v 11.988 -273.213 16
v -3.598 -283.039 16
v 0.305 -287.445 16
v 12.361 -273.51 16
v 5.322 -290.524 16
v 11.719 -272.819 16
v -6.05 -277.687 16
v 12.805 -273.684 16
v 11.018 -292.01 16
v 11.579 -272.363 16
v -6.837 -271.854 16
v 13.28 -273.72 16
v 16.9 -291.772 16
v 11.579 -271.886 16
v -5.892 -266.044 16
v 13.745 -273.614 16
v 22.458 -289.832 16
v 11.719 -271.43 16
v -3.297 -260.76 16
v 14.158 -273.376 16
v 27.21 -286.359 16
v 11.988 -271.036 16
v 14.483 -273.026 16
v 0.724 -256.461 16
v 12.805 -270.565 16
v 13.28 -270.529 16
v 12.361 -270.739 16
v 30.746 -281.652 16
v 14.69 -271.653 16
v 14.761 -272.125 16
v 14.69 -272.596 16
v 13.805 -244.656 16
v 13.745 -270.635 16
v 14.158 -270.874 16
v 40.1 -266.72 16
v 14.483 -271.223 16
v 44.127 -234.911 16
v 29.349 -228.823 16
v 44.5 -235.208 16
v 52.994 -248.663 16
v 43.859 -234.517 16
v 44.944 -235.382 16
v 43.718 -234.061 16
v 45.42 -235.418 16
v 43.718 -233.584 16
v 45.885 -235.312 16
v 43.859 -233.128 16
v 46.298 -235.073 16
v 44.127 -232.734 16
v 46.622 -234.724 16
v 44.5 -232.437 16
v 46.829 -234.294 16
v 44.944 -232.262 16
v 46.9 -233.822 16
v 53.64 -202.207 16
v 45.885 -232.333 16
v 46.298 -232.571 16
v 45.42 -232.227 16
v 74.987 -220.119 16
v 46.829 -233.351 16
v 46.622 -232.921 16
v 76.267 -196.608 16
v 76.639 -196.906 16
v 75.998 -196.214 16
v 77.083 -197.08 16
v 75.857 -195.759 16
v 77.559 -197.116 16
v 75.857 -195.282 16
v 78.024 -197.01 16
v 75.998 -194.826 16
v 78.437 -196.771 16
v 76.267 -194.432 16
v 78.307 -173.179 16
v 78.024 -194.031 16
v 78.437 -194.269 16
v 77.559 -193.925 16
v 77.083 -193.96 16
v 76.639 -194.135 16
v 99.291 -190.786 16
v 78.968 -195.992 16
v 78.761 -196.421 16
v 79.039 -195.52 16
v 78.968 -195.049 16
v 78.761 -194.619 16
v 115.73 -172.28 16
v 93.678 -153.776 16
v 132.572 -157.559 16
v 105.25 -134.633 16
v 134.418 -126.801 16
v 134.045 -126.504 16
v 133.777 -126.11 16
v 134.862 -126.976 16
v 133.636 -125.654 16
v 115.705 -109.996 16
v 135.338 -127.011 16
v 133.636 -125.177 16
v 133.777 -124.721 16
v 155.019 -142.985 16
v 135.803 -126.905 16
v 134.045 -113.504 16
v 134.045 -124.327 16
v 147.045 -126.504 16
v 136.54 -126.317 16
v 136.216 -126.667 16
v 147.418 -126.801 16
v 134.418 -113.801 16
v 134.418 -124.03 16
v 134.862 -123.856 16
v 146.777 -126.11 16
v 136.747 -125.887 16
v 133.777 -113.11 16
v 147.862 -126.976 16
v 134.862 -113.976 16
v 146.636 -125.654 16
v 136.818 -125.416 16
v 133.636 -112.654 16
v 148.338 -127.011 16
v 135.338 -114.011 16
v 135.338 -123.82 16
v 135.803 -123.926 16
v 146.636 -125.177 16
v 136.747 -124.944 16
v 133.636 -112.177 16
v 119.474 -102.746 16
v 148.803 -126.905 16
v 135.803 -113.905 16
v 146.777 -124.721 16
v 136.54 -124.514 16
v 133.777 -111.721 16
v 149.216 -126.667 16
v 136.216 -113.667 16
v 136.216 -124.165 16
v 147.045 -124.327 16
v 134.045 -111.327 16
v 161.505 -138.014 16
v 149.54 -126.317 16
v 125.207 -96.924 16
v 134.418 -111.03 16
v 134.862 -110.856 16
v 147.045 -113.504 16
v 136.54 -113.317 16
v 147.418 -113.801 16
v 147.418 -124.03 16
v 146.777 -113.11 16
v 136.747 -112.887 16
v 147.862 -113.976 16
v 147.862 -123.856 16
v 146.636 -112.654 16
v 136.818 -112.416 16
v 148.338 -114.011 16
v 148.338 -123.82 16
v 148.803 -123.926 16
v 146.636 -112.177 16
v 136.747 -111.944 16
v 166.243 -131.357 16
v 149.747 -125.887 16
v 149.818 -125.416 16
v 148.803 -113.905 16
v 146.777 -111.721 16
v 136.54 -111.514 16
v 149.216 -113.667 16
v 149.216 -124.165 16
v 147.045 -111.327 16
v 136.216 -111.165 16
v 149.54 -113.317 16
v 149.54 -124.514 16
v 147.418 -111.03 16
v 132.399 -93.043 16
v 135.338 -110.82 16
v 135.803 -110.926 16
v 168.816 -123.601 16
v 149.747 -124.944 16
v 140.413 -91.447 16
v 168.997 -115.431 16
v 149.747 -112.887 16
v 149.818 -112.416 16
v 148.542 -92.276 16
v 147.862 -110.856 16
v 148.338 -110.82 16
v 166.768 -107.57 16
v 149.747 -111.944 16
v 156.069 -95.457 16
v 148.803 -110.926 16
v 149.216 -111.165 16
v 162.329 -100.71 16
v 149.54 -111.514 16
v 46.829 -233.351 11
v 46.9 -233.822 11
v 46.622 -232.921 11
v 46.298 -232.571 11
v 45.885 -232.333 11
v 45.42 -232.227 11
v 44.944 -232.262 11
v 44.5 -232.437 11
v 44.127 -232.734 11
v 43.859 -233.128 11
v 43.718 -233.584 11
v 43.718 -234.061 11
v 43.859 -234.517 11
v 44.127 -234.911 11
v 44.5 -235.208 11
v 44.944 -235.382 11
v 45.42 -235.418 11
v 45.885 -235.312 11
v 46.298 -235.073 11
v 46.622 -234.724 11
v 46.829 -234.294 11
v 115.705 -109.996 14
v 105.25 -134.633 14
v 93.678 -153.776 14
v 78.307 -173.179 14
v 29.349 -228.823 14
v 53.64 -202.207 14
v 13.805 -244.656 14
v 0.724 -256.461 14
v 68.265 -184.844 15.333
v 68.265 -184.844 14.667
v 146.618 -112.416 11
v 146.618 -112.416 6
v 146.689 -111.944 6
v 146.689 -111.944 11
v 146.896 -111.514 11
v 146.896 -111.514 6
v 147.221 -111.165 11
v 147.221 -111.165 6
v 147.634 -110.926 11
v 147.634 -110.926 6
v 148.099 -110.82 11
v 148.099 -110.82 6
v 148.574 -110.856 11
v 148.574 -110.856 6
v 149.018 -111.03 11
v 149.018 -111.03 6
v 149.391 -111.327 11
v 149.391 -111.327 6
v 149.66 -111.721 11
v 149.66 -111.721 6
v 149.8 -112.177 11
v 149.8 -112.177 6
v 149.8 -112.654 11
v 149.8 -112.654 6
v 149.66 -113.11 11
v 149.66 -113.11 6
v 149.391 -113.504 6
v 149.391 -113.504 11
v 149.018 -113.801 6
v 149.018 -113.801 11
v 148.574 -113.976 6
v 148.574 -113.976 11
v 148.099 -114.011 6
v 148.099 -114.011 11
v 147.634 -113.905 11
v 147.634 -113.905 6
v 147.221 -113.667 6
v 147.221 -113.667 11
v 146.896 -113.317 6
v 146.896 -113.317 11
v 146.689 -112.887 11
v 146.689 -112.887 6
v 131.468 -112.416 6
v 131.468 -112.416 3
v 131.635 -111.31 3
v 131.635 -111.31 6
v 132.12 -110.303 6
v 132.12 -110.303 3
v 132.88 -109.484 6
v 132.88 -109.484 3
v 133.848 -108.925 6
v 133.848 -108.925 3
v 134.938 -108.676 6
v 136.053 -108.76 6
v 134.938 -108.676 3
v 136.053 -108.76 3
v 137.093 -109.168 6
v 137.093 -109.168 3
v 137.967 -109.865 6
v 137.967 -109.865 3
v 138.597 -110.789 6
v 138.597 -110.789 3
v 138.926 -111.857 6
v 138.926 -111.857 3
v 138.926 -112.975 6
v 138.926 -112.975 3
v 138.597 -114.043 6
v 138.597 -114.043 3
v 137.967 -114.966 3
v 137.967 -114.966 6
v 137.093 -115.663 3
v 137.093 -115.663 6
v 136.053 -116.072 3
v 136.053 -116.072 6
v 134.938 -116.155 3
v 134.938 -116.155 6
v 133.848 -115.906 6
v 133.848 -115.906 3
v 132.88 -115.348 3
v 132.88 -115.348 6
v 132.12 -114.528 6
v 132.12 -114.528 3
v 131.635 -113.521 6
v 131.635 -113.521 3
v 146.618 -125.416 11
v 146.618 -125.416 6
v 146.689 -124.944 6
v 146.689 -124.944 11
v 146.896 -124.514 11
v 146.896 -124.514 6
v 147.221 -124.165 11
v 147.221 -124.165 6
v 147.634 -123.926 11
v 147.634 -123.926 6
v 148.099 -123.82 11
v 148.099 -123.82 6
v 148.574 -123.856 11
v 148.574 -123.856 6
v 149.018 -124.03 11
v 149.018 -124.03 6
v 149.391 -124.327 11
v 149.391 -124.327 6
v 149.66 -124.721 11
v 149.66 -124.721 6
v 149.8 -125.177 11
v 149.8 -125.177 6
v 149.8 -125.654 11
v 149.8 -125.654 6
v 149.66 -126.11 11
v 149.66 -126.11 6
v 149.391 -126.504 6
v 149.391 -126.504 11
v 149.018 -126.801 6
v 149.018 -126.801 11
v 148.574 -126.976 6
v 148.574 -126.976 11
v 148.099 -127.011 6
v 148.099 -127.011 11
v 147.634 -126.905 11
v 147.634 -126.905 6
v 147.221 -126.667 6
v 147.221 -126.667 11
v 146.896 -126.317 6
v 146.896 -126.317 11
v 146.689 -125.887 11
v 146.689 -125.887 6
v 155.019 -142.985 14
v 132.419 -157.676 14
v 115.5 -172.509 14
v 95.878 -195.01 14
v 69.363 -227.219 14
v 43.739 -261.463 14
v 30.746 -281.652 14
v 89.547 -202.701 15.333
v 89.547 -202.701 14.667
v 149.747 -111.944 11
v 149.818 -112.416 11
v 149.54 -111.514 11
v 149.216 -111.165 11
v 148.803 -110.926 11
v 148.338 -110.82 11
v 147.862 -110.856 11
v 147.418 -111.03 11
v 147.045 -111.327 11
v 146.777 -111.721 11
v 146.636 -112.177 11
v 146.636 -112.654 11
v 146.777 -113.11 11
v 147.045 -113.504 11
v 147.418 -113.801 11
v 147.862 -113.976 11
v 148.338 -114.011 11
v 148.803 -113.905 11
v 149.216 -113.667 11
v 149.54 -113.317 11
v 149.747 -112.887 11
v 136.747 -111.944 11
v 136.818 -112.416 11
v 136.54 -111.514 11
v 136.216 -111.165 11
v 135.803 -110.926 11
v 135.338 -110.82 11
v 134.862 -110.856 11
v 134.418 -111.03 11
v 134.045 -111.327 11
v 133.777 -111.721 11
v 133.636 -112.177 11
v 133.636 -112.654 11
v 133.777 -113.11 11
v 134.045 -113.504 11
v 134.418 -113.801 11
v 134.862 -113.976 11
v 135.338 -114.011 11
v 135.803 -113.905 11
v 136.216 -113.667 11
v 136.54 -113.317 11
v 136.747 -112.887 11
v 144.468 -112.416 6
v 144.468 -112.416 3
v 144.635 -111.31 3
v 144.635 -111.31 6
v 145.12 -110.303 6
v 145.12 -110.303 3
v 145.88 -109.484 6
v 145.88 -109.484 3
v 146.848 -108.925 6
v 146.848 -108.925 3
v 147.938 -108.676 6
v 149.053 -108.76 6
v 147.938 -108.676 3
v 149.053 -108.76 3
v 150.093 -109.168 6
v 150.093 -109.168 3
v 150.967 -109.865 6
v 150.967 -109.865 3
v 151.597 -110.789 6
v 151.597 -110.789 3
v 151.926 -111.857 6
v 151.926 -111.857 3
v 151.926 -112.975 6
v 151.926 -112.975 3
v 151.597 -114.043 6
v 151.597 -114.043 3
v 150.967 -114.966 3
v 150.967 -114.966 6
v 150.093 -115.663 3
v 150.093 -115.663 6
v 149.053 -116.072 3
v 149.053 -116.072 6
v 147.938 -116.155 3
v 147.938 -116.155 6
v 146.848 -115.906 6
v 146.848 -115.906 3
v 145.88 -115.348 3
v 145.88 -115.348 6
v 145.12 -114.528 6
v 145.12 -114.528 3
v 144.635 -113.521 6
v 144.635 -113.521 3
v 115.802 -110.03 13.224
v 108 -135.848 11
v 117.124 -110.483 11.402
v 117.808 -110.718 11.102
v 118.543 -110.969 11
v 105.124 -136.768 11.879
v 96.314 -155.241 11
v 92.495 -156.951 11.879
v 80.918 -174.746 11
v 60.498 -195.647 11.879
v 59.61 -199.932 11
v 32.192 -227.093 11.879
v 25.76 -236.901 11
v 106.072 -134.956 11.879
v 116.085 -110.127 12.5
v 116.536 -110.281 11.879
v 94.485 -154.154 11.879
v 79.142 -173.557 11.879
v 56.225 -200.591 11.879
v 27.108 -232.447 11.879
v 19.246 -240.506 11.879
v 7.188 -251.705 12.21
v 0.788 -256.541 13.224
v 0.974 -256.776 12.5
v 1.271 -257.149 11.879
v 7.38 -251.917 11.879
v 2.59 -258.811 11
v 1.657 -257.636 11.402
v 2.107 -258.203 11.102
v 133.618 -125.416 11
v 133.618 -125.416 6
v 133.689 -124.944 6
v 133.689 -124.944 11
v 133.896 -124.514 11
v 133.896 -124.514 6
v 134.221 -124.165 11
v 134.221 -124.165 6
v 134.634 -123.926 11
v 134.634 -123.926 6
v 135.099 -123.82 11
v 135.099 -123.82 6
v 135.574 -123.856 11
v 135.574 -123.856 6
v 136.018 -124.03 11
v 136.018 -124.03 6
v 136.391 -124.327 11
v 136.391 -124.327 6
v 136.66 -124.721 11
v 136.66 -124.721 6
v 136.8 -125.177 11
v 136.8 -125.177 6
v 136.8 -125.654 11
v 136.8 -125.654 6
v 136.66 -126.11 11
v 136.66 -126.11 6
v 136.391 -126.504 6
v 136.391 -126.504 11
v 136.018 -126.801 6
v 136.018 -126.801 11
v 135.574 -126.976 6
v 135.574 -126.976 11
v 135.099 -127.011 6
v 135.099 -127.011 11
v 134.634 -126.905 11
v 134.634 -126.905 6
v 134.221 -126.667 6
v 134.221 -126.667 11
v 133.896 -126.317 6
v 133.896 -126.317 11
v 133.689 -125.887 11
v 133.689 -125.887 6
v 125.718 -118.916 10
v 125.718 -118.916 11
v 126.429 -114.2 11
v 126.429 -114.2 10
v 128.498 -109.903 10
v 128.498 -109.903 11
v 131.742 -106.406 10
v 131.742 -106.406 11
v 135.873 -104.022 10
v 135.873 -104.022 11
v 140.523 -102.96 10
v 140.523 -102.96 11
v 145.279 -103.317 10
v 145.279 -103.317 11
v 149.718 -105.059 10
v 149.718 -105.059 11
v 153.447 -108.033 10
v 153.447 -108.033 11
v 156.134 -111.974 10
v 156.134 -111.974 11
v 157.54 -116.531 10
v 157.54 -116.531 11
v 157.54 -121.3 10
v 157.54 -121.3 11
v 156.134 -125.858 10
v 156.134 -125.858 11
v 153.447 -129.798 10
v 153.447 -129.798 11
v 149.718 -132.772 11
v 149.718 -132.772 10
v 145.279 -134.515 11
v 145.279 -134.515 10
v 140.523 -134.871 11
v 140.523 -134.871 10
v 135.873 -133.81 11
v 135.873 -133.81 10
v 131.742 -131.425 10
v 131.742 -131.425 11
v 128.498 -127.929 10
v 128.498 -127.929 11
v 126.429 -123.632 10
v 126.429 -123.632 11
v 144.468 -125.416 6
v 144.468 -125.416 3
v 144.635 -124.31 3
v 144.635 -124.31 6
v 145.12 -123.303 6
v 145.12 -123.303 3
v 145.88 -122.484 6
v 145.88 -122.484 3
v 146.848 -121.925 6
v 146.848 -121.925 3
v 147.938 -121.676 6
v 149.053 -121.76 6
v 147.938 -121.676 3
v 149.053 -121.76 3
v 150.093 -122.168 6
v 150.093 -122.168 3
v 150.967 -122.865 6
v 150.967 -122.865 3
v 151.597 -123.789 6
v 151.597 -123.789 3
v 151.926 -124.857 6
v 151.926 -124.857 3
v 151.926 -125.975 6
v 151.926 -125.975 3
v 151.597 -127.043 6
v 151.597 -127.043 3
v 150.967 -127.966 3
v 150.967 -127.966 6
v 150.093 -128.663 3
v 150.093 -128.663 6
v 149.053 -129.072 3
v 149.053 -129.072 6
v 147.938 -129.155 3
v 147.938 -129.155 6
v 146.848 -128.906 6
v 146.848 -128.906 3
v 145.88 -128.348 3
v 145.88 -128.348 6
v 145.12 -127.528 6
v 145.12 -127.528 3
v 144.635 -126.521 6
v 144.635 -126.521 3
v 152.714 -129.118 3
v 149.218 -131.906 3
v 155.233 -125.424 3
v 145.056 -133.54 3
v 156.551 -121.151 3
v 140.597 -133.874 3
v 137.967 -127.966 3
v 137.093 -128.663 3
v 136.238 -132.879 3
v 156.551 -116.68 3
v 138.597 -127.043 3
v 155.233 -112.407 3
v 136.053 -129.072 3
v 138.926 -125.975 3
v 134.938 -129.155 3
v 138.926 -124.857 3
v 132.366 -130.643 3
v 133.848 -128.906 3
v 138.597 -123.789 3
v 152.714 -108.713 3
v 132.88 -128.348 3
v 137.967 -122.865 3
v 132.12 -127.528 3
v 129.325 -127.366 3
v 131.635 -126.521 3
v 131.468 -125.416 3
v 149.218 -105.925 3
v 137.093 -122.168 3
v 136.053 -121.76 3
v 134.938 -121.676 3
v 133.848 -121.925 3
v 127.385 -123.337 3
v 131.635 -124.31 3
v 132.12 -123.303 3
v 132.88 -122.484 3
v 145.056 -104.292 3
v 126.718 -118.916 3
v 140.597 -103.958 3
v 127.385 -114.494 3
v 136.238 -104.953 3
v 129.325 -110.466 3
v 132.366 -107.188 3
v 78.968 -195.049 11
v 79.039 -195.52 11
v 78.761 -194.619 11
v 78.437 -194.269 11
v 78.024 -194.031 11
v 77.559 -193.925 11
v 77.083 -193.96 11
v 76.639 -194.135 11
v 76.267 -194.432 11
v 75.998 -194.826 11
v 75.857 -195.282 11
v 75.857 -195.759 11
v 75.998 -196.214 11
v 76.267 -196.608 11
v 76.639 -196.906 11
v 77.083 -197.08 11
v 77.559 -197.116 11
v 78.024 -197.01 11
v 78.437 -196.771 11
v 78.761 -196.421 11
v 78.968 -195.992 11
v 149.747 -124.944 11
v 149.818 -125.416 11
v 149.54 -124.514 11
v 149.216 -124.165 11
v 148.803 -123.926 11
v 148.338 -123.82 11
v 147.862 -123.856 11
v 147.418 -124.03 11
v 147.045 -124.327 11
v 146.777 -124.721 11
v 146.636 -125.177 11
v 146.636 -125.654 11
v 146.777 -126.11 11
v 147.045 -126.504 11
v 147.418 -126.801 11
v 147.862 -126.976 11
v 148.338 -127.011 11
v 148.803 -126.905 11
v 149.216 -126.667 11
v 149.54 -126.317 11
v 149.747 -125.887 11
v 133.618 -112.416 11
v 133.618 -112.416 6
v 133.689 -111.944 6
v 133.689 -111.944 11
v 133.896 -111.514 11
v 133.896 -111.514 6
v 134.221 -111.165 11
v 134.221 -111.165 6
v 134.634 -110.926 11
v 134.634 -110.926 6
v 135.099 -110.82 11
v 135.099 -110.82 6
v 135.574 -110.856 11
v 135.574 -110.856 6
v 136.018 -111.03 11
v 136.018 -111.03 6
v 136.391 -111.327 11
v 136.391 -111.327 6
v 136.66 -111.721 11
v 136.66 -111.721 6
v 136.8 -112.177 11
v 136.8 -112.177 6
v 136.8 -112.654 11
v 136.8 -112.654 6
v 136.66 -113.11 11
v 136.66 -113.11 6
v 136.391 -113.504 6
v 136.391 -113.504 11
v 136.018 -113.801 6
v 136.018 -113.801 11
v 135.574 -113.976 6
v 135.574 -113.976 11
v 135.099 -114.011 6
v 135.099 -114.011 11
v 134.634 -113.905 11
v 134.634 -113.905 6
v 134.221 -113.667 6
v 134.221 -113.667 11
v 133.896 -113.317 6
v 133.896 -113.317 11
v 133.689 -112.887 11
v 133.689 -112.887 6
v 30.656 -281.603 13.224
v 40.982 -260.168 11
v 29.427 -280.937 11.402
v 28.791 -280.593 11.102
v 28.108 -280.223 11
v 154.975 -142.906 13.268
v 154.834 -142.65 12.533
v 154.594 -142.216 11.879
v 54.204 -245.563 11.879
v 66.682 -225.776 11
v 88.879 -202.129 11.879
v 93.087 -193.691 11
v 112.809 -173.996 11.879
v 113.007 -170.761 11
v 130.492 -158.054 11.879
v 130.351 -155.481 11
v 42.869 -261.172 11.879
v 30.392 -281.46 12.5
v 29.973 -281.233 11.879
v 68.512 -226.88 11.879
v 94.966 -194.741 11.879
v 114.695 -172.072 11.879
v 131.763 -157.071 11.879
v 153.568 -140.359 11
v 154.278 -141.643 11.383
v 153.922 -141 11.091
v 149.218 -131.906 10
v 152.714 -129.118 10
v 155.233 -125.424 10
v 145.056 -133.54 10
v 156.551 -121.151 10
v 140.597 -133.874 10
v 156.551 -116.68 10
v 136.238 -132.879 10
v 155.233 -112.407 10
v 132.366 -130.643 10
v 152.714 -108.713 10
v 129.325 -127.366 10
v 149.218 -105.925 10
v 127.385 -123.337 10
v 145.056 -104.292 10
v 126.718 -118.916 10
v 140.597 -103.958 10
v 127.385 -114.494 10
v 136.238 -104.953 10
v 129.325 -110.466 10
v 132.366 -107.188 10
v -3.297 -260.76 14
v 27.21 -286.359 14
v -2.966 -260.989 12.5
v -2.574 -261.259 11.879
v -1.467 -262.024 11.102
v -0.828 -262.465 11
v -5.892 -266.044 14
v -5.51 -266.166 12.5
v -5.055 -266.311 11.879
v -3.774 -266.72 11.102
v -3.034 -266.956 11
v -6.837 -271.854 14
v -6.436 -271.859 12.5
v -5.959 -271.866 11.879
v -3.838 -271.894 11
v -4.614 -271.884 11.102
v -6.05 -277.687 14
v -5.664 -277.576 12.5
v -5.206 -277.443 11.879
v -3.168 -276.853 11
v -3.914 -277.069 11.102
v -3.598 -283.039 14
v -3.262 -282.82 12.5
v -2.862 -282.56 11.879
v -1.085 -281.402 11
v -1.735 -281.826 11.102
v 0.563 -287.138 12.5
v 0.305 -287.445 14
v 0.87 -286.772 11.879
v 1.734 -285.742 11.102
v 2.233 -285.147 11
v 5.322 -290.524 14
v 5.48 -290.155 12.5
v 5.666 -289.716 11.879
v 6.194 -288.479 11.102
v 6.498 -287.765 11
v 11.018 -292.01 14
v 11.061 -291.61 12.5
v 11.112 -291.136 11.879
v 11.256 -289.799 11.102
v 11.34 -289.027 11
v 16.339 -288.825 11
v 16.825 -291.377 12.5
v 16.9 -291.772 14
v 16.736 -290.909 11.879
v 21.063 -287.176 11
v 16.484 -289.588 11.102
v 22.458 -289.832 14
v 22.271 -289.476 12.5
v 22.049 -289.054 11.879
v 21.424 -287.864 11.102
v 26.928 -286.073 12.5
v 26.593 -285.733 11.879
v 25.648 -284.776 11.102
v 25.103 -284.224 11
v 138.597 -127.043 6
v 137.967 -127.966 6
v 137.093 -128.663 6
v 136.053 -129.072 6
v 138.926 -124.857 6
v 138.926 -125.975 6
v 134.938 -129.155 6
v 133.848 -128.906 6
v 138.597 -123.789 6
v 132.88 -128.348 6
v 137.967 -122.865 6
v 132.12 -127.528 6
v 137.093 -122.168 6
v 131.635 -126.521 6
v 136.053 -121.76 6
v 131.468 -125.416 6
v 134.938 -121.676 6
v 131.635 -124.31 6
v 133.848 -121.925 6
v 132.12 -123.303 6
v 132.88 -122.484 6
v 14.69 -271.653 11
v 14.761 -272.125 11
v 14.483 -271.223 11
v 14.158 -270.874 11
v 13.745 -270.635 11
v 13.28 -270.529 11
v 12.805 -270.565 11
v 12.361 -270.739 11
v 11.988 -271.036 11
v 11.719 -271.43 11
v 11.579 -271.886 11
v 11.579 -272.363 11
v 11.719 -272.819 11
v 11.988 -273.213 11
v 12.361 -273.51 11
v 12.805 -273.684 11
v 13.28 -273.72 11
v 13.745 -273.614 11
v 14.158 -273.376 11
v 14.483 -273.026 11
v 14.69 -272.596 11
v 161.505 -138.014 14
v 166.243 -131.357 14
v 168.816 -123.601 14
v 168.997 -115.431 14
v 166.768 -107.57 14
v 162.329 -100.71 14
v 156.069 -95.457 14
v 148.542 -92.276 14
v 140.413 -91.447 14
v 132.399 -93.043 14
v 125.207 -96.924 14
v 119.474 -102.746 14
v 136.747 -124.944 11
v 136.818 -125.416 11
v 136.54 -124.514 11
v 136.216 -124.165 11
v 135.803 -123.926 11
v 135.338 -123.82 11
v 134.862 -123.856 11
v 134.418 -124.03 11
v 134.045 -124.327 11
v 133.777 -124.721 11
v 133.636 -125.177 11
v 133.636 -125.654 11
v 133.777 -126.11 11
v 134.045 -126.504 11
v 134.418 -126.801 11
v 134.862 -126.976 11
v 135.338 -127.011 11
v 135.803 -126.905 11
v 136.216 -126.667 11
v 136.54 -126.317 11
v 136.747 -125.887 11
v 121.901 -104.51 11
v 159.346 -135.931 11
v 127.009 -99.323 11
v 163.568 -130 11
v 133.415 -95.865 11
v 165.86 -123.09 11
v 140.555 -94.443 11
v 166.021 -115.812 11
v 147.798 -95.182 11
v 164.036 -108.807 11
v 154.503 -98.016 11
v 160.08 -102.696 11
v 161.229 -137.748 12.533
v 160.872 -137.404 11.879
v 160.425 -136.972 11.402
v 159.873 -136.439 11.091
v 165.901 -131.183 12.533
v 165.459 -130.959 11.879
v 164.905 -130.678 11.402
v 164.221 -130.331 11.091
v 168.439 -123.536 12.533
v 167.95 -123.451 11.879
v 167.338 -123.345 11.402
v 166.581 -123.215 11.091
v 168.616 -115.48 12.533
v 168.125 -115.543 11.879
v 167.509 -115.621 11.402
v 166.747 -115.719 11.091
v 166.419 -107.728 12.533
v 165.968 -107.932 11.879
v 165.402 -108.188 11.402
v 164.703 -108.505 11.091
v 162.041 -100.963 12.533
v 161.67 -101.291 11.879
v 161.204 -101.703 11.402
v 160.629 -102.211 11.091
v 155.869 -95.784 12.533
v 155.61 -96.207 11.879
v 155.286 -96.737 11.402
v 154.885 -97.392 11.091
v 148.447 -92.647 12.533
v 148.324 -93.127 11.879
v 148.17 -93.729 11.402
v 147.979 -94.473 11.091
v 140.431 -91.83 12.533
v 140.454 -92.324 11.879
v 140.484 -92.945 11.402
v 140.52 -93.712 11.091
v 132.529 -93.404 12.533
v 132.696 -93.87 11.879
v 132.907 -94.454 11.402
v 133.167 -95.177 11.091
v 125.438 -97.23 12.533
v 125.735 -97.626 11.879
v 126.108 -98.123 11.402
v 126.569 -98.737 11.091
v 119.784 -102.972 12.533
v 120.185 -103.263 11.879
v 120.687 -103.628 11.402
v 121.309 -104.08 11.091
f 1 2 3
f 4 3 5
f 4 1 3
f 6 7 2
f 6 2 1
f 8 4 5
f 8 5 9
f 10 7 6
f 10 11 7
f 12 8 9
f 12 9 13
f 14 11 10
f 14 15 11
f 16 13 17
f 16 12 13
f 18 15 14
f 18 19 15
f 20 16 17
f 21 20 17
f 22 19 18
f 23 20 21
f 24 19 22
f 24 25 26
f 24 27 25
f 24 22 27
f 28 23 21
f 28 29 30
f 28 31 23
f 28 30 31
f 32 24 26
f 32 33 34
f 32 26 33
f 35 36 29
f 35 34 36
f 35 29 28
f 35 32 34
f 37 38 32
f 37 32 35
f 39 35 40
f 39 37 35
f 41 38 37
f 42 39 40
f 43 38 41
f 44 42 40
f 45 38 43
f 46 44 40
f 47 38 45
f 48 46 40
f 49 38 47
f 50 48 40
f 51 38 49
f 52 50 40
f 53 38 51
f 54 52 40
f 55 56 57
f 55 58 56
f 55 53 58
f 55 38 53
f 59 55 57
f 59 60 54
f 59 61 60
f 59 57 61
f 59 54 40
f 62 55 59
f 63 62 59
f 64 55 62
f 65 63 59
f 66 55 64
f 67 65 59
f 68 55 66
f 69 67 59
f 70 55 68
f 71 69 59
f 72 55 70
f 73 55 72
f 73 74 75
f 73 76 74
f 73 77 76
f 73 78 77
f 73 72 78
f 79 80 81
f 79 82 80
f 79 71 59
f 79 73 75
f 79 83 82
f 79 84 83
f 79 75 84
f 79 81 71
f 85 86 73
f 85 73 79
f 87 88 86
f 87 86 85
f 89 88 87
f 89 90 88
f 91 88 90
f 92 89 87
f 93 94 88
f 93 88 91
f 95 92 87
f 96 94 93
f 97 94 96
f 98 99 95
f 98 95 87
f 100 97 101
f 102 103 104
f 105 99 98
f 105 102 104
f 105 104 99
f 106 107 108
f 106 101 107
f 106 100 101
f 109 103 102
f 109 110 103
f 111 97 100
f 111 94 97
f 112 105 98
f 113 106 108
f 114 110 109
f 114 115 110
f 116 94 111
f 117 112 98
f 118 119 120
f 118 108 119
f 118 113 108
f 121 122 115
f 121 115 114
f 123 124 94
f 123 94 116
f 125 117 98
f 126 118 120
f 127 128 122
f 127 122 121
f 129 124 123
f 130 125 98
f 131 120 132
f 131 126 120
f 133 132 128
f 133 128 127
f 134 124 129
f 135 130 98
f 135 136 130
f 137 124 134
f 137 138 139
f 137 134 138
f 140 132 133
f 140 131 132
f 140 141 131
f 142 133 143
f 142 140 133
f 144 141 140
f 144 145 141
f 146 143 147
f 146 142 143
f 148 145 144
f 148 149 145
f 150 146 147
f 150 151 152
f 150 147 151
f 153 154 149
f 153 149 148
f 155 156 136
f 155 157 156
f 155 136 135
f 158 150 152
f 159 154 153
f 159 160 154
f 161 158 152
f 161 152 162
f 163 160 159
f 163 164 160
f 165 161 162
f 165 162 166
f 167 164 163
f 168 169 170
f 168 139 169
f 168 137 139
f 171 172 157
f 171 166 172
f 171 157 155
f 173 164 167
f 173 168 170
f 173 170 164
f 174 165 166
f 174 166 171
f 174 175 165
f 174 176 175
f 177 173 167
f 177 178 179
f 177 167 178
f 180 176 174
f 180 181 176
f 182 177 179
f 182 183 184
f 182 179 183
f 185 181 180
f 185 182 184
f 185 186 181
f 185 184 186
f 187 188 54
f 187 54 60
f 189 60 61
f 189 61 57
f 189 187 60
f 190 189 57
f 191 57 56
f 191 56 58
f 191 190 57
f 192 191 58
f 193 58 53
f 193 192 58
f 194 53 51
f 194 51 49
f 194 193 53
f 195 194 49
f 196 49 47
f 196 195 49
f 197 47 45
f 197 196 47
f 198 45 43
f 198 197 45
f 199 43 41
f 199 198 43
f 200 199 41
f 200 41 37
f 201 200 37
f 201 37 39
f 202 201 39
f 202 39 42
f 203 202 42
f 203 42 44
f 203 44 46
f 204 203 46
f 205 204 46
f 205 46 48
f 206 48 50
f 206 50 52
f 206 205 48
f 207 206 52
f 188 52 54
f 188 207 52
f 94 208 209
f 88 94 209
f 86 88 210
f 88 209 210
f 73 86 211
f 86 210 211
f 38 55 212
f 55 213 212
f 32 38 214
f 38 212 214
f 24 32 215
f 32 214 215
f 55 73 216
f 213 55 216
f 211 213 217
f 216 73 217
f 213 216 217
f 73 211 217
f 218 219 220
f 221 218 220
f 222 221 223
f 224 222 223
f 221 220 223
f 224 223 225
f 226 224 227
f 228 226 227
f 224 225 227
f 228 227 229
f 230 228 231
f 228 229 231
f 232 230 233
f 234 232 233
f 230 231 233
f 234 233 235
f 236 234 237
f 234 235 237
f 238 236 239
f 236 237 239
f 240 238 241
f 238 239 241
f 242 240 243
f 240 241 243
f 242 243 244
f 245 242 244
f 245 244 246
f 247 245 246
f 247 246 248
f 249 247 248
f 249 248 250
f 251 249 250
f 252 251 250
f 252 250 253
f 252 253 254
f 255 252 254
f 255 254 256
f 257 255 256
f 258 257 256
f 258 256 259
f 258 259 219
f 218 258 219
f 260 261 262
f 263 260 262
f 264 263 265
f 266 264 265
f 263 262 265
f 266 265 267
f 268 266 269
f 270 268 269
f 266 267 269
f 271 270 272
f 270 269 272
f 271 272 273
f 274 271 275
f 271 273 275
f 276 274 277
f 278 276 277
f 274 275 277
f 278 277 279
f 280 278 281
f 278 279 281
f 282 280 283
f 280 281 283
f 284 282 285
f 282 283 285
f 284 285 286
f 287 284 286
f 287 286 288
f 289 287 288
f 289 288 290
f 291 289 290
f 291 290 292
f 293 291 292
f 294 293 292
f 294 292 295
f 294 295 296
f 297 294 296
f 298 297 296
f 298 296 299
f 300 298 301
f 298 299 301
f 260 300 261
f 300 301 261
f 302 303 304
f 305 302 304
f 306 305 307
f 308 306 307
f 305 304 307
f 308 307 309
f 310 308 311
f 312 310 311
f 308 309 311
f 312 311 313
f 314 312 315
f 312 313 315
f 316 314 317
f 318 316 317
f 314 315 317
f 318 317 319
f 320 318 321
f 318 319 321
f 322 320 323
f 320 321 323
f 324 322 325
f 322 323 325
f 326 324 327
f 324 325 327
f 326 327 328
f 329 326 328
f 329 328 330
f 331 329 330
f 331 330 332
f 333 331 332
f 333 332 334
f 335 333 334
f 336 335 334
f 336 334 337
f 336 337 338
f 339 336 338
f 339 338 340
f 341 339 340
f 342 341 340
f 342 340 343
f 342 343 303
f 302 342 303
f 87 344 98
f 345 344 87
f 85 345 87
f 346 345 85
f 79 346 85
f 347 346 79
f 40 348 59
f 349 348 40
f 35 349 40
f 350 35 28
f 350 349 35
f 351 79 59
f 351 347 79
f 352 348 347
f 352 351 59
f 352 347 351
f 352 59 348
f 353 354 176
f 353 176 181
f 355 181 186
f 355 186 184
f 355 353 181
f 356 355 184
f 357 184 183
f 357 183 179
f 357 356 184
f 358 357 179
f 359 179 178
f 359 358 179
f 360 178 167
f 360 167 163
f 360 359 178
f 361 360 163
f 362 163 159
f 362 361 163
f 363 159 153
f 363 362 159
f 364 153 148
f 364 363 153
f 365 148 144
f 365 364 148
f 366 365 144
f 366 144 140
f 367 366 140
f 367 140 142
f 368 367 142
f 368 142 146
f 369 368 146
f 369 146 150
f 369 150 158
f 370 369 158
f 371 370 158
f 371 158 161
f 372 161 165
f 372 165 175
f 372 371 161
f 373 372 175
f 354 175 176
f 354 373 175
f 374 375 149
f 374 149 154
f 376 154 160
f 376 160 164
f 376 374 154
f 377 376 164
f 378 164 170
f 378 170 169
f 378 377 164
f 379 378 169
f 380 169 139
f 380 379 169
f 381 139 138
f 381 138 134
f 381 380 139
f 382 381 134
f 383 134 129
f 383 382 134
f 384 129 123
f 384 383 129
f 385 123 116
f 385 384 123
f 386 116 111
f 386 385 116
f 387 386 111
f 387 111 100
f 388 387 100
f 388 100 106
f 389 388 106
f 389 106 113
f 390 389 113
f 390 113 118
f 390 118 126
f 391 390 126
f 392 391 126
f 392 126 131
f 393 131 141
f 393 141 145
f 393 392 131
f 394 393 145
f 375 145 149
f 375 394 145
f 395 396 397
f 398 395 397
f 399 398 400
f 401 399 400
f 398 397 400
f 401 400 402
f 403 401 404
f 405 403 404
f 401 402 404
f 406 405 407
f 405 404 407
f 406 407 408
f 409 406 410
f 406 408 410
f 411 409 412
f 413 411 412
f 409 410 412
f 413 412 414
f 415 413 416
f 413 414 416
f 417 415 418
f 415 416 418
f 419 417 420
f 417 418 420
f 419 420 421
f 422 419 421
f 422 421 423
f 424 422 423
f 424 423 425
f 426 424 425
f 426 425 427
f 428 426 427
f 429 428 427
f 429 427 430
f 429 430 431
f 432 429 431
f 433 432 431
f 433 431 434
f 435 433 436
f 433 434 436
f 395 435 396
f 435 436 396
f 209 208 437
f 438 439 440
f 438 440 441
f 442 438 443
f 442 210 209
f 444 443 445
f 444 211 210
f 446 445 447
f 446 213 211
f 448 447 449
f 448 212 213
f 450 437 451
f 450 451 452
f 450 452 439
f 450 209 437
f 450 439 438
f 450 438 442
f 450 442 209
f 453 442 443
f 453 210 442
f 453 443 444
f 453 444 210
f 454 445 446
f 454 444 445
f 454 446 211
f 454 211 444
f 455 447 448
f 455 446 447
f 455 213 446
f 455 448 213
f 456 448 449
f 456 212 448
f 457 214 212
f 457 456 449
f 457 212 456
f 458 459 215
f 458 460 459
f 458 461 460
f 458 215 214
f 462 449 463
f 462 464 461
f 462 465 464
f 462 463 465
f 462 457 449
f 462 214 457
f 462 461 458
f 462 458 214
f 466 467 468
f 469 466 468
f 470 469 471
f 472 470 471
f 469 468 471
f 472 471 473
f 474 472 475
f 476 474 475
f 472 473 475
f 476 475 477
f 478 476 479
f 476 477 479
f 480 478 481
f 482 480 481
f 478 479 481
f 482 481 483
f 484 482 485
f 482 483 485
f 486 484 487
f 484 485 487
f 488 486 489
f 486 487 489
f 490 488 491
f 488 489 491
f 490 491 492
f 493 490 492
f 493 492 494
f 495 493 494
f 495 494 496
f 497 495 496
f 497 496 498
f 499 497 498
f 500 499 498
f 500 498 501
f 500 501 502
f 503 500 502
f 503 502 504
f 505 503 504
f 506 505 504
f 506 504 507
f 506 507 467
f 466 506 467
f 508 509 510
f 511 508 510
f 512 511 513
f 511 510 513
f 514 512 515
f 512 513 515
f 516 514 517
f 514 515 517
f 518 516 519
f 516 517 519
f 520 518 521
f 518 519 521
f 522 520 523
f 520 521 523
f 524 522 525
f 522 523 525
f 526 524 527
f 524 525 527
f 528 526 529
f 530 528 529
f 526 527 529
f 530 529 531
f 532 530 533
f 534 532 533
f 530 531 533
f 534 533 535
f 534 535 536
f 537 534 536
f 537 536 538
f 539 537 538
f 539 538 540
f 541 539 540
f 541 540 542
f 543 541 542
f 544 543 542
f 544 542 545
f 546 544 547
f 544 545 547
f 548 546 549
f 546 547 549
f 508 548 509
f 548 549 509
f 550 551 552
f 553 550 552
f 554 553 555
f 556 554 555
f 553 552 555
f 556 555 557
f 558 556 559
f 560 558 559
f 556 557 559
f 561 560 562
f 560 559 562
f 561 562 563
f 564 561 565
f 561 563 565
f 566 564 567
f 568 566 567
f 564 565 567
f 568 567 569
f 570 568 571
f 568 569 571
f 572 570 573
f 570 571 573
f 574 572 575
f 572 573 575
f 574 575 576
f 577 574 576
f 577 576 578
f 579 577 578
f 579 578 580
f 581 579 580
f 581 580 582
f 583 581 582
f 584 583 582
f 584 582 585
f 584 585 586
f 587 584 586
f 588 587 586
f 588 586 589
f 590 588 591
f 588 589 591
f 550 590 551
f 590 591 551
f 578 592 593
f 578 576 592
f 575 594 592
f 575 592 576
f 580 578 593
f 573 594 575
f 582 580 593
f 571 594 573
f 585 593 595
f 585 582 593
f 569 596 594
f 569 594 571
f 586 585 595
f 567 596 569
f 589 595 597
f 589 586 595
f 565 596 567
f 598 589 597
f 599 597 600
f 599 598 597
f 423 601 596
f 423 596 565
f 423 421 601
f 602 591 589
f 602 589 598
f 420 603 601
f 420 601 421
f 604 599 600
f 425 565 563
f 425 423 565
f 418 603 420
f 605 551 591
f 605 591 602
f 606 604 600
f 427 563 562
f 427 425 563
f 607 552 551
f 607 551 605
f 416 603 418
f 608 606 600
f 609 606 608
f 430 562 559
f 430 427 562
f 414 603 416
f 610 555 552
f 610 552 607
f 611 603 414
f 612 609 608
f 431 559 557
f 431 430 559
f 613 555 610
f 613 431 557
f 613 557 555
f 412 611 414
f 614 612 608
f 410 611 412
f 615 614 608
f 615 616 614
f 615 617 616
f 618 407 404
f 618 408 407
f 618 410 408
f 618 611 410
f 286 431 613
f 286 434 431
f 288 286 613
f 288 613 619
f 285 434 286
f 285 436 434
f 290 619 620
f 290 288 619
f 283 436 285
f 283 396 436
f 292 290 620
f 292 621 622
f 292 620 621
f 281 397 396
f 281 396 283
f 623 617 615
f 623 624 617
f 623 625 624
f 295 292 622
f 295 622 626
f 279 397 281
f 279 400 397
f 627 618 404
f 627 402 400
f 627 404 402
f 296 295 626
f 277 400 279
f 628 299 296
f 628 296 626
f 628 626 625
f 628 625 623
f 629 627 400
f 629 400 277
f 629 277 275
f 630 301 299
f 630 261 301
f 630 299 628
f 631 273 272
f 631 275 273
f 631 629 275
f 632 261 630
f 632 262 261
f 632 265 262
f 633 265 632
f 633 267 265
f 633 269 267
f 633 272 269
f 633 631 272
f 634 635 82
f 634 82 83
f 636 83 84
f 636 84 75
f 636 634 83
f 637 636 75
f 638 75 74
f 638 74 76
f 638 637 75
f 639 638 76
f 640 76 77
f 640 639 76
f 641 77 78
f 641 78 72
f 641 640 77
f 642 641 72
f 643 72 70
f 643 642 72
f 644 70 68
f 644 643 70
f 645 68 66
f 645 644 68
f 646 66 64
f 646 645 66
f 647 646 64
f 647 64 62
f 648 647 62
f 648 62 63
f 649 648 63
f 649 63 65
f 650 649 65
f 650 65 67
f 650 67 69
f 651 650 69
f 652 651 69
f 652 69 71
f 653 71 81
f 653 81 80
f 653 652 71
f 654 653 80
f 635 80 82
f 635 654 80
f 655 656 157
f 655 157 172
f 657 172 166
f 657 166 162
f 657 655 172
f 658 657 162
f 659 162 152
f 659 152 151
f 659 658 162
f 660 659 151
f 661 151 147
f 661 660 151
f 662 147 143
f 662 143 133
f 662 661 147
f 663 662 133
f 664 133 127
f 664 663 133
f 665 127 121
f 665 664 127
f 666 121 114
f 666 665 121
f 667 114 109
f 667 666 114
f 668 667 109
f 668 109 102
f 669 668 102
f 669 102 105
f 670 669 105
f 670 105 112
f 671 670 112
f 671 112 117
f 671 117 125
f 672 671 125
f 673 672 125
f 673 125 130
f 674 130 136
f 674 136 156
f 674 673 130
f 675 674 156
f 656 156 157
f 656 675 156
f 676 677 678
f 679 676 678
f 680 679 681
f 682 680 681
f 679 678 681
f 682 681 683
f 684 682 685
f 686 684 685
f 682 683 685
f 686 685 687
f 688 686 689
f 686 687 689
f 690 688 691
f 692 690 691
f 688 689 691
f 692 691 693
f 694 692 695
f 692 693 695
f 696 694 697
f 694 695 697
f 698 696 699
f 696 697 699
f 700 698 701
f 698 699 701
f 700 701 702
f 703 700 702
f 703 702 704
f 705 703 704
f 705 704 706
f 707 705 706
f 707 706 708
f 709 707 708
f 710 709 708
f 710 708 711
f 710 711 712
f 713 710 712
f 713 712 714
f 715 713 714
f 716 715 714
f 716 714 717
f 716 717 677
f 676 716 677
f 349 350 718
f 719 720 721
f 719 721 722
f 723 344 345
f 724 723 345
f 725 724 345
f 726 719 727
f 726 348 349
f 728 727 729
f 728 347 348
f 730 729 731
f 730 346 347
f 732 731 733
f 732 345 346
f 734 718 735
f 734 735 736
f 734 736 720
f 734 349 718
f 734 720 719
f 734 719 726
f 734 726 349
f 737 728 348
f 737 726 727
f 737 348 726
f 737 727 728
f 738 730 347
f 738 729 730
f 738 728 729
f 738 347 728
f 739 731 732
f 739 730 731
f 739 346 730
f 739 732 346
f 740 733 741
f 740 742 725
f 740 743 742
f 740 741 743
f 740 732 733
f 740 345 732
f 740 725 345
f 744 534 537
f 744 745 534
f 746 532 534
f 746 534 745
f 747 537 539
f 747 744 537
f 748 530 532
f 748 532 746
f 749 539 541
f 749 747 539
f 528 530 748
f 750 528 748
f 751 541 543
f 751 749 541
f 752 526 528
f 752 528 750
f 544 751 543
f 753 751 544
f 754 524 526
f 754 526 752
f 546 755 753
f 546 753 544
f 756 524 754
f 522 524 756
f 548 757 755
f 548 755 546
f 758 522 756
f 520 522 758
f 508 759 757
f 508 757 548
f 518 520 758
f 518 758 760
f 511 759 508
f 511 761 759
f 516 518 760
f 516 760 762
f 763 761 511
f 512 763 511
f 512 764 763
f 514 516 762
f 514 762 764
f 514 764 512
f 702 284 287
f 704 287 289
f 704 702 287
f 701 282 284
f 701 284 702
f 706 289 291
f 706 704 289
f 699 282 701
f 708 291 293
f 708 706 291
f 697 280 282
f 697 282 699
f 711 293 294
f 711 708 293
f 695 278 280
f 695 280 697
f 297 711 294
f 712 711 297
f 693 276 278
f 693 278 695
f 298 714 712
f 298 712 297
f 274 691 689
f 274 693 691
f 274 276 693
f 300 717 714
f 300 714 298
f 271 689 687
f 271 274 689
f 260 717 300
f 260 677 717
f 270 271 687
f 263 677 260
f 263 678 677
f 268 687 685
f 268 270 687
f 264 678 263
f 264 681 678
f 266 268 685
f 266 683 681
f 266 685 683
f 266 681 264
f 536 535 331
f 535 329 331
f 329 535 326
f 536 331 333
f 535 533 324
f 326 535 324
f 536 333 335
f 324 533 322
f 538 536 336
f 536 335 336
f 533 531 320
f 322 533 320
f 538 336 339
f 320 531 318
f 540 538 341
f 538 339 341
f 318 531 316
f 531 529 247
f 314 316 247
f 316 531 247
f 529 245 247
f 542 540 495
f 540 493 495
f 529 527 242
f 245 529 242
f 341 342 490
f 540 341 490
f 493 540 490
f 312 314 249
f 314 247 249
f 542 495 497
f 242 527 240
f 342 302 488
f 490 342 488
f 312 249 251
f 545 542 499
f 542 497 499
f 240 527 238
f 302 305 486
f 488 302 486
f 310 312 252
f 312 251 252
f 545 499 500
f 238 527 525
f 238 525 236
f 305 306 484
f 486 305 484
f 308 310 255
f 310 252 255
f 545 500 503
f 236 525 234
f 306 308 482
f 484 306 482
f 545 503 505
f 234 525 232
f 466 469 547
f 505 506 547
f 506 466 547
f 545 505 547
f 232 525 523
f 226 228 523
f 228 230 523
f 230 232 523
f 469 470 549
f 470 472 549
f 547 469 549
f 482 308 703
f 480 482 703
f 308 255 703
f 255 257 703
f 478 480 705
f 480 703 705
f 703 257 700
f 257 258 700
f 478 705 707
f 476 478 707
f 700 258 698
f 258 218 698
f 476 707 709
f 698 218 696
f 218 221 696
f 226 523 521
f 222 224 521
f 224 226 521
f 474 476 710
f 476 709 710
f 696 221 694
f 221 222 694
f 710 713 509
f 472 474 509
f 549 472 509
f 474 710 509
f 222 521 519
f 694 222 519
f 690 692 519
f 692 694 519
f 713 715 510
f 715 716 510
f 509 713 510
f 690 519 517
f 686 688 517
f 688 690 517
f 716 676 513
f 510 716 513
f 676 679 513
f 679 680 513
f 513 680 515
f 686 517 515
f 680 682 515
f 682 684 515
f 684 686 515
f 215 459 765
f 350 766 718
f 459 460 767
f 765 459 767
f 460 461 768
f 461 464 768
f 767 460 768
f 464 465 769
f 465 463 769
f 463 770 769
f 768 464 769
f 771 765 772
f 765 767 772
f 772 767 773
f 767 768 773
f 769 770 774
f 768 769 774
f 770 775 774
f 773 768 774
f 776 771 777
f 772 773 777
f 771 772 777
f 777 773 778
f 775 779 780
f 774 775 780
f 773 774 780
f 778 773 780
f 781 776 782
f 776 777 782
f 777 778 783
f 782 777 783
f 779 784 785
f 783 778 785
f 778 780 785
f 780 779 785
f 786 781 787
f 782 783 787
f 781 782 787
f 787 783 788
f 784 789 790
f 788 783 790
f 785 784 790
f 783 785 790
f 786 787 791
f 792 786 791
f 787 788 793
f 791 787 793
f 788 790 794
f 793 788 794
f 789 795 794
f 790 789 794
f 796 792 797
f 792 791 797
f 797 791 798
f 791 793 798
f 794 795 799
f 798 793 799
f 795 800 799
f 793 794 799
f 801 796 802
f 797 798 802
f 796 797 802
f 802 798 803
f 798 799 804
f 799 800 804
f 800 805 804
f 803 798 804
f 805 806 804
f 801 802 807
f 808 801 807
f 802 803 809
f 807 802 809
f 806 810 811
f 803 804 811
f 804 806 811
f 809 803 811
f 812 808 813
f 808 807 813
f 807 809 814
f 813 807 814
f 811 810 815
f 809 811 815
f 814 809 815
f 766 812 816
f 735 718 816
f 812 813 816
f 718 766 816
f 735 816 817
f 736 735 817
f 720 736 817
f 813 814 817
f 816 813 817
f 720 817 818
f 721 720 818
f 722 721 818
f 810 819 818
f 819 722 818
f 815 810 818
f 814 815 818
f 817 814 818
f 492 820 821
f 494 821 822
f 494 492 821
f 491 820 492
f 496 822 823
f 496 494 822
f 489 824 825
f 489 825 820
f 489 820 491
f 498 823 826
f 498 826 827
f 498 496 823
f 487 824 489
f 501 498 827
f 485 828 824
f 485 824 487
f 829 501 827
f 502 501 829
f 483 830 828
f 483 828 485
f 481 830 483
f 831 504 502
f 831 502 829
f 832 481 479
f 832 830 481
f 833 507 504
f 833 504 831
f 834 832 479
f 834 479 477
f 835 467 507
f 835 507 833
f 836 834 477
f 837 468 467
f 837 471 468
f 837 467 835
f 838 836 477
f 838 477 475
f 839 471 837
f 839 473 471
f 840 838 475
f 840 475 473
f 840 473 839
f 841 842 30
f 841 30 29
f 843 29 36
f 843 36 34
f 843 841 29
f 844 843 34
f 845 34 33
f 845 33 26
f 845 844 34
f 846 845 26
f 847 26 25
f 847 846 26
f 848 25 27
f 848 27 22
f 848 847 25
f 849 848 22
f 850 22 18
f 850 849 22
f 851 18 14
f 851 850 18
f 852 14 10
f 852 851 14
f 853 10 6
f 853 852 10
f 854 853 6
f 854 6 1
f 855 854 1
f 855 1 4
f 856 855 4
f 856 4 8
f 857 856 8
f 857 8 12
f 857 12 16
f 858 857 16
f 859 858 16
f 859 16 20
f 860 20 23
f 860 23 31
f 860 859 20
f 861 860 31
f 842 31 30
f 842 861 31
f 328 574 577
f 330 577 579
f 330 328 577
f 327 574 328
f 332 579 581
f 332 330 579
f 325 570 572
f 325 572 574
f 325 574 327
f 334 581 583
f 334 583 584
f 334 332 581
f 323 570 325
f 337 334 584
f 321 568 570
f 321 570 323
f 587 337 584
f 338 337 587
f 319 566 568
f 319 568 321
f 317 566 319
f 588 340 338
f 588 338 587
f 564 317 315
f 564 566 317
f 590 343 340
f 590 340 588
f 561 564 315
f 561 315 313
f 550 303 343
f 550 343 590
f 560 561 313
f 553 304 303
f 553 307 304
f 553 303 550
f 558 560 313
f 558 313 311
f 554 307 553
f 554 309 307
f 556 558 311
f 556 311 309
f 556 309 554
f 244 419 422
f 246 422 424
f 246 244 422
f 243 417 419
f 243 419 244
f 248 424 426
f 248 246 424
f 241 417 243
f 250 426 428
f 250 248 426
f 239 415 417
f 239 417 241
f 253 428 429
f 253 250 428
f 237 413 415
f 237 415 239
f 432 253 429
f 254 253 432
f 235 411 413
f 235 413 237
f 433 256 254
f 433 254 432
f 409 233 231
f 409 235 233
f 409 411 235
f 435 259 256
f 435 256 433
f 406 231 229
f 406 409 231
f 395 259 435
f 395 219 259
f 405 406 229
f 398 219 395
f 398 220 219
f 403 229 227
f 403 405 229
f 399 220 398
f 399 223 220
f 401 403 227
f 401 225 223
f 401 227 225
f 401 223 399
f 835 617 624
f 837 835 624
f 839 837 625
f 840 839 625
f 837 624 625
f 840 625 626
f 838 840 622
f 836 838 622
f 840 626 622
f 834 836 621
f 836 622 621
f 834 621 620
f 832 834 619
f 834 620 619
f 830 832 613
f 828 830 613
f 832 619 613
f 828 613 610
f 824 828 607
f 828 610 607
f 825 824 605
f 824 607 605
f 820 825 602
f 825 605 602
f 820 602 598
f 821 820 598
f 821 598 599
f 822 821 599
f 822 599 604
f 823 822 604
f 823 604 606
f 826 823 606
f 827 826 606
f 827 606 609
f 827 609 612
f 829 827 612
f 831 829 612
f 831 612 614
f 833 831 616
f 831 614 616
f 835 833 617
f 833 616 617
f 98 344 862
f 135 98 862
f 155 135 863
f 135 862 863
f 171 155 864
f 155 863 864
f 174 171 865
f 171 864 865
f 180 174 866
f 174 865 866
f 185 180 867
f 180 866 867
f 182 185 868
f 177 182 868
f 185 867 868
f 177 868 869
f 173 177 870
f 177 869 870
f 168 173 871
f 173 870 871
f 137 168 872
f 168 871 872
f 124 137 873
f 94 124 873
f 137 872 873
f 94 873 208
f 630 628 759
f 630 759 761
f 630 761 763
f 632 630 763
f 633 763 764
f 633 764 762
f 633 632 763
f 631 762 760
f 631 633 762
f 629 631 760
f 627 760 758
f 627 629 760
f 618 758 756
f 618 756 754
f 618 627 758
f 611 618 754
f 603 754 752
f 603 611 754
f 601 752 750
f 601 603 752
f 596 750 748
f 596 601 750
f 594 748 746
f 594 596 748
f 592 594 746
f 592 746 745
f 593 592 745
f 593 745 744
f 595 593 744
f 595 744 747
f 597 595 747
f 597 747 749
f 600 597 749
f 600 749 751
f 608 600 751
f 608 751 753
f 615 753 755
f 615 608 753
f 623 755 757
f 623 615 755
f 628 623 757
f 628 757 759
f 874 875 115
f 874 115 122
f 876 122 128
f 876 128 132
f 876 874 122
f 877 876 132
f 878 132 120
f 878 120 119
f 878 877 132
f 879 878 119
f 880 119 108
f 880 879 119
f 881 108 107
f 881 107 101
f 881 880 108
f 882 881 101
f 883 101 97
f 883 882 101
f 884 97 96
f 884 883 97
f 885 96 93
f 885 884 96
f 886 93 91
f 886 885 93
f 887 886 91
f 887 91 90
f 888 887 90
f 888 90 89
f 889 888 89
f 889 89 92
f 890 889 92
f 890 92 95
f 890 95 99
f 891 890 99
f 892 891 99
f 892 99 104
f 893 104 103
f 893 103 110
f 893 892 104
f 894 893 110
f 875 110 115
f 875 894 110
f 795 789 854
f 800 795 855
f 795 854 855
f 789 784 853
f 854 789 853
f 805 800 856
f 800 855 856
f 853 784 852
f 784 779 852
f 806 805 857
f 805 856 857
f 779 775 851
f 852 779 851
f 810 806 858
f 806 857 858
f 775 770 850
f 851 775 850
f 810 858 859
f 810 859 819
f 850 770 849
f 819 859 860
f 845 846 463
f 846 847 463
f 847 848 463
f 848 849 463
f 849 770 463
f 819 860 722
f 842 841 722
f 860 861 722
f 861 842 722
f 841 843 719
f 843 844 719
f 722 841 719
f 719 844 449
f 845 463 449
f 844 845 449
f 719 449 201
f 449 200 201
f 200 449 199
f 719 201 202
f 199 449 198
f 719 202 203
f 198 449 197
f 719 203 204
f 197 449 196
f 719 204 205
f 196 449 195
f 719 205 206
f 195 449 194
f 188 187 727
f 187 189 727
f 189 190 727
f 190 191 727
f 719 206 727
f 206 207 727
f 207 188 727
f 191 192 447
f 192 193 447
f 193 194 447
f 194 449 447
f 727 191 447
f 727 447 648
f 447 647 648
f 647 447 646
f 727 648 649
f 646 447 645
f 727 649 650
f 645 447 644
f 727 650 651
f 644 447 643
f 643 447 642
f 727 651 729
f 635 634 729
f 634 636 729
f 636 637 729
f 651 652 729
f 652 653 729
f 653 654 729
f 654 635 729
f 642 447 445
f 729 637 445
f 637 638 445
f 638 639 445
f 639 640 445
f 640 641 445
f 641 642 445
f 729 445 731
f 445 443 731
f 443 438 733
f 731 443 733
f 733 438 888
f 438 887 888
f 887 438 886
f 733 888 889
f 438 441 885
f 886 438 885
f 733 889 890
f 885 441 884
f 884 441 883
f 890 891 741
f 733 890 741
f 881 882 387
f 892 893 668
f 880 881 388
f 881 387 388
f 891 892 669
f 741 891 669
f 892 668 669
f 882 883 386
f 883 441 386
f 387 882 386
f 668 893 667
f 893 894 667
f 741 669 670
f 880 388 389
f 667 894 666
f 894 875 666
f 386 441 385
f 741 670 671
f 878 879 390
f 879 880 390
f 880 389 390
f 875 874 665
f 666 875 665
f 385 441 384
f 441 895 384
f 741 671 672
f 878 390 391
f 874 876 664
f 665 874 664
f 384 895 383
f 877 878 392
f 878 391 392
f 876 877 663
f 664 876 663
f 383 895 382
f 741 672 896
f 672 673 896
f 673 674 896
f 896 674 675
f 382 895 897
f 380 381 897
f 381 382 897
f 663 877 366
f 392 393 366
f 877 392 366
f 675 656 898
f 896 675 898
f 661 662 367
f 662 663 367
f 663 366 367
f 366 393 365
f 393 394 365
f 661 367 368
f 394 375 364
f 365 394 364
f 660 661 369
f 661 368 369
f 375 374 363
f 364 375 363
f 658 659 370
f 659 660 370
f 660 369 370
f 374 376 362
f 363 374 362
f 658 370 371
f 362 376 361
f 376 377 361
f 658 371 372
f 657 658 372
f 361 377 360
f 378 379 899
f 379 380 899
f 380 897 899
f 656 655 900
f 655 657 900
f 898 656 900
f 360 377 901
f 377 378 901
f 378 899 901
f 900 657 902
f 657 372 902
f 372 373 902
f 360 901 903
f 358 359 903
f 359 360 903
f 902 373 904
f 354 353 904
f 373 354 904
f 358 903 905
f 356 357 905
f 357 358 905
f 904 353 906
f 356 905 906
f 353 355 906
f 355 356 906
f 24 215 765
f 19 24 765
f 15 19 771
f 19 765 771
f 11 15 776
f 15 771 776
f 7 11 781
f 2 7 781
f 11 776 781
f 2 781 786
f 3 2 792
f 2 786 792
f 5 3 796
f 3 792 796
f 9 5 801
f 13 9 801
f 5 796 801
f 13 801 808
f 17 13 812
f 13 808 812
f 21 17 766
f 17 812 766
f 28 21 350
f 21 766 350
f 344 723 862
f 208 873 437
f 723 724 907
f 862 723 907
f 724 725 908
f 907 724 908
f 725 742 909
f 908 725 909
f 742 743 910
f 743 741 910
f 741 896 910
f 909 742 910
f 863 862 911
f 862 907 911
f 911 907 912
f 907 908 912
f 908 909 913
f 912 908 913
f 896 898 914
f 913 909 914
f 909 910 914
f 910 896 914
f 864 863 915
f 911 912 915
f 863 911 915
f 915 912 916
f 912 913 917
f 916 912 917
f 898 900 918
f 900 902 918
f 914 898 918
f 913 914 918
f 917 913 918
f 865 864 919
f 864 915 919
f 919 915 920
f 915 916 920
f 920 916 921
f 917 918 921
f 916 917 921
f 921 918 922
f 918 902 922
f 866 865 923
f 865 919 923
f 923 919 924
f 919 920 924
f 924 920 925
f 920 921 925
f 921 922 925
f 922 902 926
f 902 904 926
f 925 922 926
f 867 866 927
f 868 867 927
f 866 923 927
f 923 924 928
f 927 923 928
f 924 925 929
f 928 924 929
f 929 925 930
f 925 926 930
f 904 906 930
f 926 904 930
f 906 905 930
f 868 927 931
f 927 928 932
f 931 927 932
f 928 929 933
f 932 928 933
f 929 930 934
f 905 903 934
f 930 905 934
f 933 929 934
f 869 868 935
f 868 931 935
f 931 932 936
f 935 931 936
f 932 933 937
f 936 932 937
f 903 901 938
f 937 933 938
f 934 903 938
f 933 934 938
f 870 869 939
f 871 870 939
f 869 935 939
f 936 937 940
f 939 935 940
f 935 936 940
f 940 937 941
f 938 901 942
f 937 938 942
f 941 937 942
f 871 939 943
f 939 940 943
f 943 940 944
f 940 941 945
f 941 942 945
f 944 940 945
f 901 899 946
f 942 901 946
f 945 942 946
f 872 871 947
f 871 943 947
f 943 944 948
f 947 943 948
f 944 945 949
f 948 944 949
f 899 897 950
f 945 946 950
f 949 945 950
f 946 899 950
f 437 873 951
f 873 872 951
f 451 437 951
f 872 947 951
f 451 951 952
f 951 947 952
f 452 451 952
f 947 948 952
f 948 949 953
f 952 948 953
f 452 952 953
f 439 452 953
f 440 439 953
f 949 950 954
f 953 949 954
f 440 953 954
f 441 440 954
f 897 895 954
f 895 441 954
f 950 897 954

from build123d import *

# Parameters (mm, degrees)
SKETCH1_R           = 1.6
BOSS_EXTRUDE1_DEPTH = 5
SKETCH2_R           = 16
SKETCH2_R_2         = 1.6
BOSS_EXTRUDE2_DEPTH = 1
BOSS_EXTRUDE3_START = 7
SKETCH3_R           = 15
SKETCH3_R_2         = 1.6
BOSS_EXTRUDE3_DEPTH = 7
SKETCH4_R           = 3.75
CUT_EXTRUDE1_DEPTH  = 3
VARFILLET2_R        = 3


with BuildPart() as part:
    # Sketch1 → Boss-Extrude1 (new body)
    with BuildSketch(Plane.XY.offset(11)):
        with BuildLine():
            ThreePointArc((155.019115612, -142.985112199), (159.394881243, -97.849485606), (115.704809966, -109.996492831))
            add(Edge.make_bspline(
                [(115.704809966, -109.996492831), (101.94879758, -150.116707379), (78.178790791, -171.772825461), (58.717079478, -197.082387325), (16.356999542, -244.049515564), (0.72448619, -256.46124476)],
                knots=[0, 0, 0, 0, 0.619090324, 0.719090324, 1, 1, 1, 1], degree=3))
            ThreePointArc((0.72448619, -256.46124476), (0.304947846, -287.445485278), (30.74561606, -281.651963762))
            add(Edge.make_bspline(
                [(155.019115612, -142.985112199), (117.897123756, -163.498941991), (100.69762913, -190.668374405), (79.152067085, -214.229377889), (40.254225745, -264.101669257), (30.74561606, -281.651963762)],
                knots=[0, 0, 0, 0, 0.619090324, 0.719090324, 1, 1, 1, 1], degree=3))
        make_face()
        with Locations((135.218221977, -112.415707792)):
            Circle(SKETCH1_R, mode=Mode.SUBTRACT)
        with Locations((148.218221977, -112.415707792)):
            Circle(SKETCH1_R, mode=Mode.SUBTRACT)
        with Locations((148.218221977, -125.415707792)):
            Circle(SKETCH1_R, mode=Mode.SUBTRACT)
        with Locations((135.218221977, -125.415707792)):
            Circle(SKETCH1_R, mode=Mode.SUBTRACT)
        with Locations((77.439461008, -195.520152104)):
            Circle(SKETCH1_R, mode=Mode.SUBTRACT)
        with Locations((45.300080524, -233.82237426)):
            Circle(SKETCH1_R, mode=Mode.SUBTRACT)
        with Locations((13.16070004, -272.124596416)):
            Circle(SKETCH1_R, mode=Mode.SUBTRACT)
    extrude(amount=BOSS_EXTRUDE1_DEPTH)

    # VarFillet2
    varfillet2_edges = [part.edges().sort_by_distance(p)[0] for p in [
        (65.360846316, -188.427744165, 11),
        (86.521548764, -206.183681785, 11),
    ]]
    fillet(varfillet2_edges, radius=VARFILLET2_R)


with BuildPart() as body_2:
    # Sketch2 → Boss-Extrude2 (new body)
    with BuildSketch(Plane(origin=(0, 0, 11), x_dir=(-1, 0, 0), z_dir=(0, 0, -1))):
        with Locations((-141.718221977, -118.915707792)):
            Circle(SKETCH2_R)
        with Locations((-148.218221977, -125.415707792)):
            Circle(SKETCH2_R_2, mode=Mode.SUBTRACT)
        with Locations((-135.218221977, -125.415707792)):
            Circle(SKETCH2_R_2, mode=Mode.SUBTRACT)
        with Locations((-148.218221977, -112.415707792)):
            Circle(SKETCH2_R_2, mode=Mode.SUBTRACT)
        with Locations((-135.218221977, -112.415707792)):
            Circle(SKETCH2_R_2, mode=Mode.SUBTRACT)
    extrude(amount=BOSS_EXTRUDE2_DEPTH)

    # Sketch3 → Boss-Extrude3 (add)
    with BuildSketch(Plane(origin=(0, 0, 10), x_dir=(-1, 0, 0), z_dir=(0, 0, -1)).offset(BOSS_EXTRUDE3_START)):
        with Locations((-141.718221977, -118.915707792)):
            Circle(SKETCH3_R)
        with Locations((-148.218221977, -125.415707792)):
            Circle(SKETCH3_R_2, mode=Mode.SUBTRACT)
        with Locations((-135.218221977, -125.415707792)):
            Circle(SKETCH3_R_2, mode=Mode.SUBTRACT)
        with Locations((-148.218221977, -112.415707792)):
            Circle(SKETCH3_R_2, mode=Mode.SUBTRACT)
        with Locations((-135.218221977, -112.415707792)):
            Circle(SKETCH3_R_2, mode=Mode.SUBTRACT)
    extrude(amount=-BOSS_EXTRUDE3_DEPTH)

    # Sketch4 → Cut-Extrude1 (cut)
    with BuildSketch(Plane(origin=(0, 0, 3), x_dir=(-1, 0, 0), z_dir=(0, 0, -1))):
        with Locations((-148.218221977, -112.415707792)):
            Circle(SKETCH4_R)
        with Locations((-135.218221977, -112.415707792)):
            Circle(SKETCH4_R)
        with Locations((-135.218221977, -125.415707792)):
            Circle(SKETCH4_R)
        with Locations((-148.218221977, -125.415707792)):
            Circle(SKETCH4_R)
    extrude(amount=-CUT_EXTRUDE1_DEPTH, mode=Mode.SUBTRACT)


solid = Compound([part.part, body_2.part])
